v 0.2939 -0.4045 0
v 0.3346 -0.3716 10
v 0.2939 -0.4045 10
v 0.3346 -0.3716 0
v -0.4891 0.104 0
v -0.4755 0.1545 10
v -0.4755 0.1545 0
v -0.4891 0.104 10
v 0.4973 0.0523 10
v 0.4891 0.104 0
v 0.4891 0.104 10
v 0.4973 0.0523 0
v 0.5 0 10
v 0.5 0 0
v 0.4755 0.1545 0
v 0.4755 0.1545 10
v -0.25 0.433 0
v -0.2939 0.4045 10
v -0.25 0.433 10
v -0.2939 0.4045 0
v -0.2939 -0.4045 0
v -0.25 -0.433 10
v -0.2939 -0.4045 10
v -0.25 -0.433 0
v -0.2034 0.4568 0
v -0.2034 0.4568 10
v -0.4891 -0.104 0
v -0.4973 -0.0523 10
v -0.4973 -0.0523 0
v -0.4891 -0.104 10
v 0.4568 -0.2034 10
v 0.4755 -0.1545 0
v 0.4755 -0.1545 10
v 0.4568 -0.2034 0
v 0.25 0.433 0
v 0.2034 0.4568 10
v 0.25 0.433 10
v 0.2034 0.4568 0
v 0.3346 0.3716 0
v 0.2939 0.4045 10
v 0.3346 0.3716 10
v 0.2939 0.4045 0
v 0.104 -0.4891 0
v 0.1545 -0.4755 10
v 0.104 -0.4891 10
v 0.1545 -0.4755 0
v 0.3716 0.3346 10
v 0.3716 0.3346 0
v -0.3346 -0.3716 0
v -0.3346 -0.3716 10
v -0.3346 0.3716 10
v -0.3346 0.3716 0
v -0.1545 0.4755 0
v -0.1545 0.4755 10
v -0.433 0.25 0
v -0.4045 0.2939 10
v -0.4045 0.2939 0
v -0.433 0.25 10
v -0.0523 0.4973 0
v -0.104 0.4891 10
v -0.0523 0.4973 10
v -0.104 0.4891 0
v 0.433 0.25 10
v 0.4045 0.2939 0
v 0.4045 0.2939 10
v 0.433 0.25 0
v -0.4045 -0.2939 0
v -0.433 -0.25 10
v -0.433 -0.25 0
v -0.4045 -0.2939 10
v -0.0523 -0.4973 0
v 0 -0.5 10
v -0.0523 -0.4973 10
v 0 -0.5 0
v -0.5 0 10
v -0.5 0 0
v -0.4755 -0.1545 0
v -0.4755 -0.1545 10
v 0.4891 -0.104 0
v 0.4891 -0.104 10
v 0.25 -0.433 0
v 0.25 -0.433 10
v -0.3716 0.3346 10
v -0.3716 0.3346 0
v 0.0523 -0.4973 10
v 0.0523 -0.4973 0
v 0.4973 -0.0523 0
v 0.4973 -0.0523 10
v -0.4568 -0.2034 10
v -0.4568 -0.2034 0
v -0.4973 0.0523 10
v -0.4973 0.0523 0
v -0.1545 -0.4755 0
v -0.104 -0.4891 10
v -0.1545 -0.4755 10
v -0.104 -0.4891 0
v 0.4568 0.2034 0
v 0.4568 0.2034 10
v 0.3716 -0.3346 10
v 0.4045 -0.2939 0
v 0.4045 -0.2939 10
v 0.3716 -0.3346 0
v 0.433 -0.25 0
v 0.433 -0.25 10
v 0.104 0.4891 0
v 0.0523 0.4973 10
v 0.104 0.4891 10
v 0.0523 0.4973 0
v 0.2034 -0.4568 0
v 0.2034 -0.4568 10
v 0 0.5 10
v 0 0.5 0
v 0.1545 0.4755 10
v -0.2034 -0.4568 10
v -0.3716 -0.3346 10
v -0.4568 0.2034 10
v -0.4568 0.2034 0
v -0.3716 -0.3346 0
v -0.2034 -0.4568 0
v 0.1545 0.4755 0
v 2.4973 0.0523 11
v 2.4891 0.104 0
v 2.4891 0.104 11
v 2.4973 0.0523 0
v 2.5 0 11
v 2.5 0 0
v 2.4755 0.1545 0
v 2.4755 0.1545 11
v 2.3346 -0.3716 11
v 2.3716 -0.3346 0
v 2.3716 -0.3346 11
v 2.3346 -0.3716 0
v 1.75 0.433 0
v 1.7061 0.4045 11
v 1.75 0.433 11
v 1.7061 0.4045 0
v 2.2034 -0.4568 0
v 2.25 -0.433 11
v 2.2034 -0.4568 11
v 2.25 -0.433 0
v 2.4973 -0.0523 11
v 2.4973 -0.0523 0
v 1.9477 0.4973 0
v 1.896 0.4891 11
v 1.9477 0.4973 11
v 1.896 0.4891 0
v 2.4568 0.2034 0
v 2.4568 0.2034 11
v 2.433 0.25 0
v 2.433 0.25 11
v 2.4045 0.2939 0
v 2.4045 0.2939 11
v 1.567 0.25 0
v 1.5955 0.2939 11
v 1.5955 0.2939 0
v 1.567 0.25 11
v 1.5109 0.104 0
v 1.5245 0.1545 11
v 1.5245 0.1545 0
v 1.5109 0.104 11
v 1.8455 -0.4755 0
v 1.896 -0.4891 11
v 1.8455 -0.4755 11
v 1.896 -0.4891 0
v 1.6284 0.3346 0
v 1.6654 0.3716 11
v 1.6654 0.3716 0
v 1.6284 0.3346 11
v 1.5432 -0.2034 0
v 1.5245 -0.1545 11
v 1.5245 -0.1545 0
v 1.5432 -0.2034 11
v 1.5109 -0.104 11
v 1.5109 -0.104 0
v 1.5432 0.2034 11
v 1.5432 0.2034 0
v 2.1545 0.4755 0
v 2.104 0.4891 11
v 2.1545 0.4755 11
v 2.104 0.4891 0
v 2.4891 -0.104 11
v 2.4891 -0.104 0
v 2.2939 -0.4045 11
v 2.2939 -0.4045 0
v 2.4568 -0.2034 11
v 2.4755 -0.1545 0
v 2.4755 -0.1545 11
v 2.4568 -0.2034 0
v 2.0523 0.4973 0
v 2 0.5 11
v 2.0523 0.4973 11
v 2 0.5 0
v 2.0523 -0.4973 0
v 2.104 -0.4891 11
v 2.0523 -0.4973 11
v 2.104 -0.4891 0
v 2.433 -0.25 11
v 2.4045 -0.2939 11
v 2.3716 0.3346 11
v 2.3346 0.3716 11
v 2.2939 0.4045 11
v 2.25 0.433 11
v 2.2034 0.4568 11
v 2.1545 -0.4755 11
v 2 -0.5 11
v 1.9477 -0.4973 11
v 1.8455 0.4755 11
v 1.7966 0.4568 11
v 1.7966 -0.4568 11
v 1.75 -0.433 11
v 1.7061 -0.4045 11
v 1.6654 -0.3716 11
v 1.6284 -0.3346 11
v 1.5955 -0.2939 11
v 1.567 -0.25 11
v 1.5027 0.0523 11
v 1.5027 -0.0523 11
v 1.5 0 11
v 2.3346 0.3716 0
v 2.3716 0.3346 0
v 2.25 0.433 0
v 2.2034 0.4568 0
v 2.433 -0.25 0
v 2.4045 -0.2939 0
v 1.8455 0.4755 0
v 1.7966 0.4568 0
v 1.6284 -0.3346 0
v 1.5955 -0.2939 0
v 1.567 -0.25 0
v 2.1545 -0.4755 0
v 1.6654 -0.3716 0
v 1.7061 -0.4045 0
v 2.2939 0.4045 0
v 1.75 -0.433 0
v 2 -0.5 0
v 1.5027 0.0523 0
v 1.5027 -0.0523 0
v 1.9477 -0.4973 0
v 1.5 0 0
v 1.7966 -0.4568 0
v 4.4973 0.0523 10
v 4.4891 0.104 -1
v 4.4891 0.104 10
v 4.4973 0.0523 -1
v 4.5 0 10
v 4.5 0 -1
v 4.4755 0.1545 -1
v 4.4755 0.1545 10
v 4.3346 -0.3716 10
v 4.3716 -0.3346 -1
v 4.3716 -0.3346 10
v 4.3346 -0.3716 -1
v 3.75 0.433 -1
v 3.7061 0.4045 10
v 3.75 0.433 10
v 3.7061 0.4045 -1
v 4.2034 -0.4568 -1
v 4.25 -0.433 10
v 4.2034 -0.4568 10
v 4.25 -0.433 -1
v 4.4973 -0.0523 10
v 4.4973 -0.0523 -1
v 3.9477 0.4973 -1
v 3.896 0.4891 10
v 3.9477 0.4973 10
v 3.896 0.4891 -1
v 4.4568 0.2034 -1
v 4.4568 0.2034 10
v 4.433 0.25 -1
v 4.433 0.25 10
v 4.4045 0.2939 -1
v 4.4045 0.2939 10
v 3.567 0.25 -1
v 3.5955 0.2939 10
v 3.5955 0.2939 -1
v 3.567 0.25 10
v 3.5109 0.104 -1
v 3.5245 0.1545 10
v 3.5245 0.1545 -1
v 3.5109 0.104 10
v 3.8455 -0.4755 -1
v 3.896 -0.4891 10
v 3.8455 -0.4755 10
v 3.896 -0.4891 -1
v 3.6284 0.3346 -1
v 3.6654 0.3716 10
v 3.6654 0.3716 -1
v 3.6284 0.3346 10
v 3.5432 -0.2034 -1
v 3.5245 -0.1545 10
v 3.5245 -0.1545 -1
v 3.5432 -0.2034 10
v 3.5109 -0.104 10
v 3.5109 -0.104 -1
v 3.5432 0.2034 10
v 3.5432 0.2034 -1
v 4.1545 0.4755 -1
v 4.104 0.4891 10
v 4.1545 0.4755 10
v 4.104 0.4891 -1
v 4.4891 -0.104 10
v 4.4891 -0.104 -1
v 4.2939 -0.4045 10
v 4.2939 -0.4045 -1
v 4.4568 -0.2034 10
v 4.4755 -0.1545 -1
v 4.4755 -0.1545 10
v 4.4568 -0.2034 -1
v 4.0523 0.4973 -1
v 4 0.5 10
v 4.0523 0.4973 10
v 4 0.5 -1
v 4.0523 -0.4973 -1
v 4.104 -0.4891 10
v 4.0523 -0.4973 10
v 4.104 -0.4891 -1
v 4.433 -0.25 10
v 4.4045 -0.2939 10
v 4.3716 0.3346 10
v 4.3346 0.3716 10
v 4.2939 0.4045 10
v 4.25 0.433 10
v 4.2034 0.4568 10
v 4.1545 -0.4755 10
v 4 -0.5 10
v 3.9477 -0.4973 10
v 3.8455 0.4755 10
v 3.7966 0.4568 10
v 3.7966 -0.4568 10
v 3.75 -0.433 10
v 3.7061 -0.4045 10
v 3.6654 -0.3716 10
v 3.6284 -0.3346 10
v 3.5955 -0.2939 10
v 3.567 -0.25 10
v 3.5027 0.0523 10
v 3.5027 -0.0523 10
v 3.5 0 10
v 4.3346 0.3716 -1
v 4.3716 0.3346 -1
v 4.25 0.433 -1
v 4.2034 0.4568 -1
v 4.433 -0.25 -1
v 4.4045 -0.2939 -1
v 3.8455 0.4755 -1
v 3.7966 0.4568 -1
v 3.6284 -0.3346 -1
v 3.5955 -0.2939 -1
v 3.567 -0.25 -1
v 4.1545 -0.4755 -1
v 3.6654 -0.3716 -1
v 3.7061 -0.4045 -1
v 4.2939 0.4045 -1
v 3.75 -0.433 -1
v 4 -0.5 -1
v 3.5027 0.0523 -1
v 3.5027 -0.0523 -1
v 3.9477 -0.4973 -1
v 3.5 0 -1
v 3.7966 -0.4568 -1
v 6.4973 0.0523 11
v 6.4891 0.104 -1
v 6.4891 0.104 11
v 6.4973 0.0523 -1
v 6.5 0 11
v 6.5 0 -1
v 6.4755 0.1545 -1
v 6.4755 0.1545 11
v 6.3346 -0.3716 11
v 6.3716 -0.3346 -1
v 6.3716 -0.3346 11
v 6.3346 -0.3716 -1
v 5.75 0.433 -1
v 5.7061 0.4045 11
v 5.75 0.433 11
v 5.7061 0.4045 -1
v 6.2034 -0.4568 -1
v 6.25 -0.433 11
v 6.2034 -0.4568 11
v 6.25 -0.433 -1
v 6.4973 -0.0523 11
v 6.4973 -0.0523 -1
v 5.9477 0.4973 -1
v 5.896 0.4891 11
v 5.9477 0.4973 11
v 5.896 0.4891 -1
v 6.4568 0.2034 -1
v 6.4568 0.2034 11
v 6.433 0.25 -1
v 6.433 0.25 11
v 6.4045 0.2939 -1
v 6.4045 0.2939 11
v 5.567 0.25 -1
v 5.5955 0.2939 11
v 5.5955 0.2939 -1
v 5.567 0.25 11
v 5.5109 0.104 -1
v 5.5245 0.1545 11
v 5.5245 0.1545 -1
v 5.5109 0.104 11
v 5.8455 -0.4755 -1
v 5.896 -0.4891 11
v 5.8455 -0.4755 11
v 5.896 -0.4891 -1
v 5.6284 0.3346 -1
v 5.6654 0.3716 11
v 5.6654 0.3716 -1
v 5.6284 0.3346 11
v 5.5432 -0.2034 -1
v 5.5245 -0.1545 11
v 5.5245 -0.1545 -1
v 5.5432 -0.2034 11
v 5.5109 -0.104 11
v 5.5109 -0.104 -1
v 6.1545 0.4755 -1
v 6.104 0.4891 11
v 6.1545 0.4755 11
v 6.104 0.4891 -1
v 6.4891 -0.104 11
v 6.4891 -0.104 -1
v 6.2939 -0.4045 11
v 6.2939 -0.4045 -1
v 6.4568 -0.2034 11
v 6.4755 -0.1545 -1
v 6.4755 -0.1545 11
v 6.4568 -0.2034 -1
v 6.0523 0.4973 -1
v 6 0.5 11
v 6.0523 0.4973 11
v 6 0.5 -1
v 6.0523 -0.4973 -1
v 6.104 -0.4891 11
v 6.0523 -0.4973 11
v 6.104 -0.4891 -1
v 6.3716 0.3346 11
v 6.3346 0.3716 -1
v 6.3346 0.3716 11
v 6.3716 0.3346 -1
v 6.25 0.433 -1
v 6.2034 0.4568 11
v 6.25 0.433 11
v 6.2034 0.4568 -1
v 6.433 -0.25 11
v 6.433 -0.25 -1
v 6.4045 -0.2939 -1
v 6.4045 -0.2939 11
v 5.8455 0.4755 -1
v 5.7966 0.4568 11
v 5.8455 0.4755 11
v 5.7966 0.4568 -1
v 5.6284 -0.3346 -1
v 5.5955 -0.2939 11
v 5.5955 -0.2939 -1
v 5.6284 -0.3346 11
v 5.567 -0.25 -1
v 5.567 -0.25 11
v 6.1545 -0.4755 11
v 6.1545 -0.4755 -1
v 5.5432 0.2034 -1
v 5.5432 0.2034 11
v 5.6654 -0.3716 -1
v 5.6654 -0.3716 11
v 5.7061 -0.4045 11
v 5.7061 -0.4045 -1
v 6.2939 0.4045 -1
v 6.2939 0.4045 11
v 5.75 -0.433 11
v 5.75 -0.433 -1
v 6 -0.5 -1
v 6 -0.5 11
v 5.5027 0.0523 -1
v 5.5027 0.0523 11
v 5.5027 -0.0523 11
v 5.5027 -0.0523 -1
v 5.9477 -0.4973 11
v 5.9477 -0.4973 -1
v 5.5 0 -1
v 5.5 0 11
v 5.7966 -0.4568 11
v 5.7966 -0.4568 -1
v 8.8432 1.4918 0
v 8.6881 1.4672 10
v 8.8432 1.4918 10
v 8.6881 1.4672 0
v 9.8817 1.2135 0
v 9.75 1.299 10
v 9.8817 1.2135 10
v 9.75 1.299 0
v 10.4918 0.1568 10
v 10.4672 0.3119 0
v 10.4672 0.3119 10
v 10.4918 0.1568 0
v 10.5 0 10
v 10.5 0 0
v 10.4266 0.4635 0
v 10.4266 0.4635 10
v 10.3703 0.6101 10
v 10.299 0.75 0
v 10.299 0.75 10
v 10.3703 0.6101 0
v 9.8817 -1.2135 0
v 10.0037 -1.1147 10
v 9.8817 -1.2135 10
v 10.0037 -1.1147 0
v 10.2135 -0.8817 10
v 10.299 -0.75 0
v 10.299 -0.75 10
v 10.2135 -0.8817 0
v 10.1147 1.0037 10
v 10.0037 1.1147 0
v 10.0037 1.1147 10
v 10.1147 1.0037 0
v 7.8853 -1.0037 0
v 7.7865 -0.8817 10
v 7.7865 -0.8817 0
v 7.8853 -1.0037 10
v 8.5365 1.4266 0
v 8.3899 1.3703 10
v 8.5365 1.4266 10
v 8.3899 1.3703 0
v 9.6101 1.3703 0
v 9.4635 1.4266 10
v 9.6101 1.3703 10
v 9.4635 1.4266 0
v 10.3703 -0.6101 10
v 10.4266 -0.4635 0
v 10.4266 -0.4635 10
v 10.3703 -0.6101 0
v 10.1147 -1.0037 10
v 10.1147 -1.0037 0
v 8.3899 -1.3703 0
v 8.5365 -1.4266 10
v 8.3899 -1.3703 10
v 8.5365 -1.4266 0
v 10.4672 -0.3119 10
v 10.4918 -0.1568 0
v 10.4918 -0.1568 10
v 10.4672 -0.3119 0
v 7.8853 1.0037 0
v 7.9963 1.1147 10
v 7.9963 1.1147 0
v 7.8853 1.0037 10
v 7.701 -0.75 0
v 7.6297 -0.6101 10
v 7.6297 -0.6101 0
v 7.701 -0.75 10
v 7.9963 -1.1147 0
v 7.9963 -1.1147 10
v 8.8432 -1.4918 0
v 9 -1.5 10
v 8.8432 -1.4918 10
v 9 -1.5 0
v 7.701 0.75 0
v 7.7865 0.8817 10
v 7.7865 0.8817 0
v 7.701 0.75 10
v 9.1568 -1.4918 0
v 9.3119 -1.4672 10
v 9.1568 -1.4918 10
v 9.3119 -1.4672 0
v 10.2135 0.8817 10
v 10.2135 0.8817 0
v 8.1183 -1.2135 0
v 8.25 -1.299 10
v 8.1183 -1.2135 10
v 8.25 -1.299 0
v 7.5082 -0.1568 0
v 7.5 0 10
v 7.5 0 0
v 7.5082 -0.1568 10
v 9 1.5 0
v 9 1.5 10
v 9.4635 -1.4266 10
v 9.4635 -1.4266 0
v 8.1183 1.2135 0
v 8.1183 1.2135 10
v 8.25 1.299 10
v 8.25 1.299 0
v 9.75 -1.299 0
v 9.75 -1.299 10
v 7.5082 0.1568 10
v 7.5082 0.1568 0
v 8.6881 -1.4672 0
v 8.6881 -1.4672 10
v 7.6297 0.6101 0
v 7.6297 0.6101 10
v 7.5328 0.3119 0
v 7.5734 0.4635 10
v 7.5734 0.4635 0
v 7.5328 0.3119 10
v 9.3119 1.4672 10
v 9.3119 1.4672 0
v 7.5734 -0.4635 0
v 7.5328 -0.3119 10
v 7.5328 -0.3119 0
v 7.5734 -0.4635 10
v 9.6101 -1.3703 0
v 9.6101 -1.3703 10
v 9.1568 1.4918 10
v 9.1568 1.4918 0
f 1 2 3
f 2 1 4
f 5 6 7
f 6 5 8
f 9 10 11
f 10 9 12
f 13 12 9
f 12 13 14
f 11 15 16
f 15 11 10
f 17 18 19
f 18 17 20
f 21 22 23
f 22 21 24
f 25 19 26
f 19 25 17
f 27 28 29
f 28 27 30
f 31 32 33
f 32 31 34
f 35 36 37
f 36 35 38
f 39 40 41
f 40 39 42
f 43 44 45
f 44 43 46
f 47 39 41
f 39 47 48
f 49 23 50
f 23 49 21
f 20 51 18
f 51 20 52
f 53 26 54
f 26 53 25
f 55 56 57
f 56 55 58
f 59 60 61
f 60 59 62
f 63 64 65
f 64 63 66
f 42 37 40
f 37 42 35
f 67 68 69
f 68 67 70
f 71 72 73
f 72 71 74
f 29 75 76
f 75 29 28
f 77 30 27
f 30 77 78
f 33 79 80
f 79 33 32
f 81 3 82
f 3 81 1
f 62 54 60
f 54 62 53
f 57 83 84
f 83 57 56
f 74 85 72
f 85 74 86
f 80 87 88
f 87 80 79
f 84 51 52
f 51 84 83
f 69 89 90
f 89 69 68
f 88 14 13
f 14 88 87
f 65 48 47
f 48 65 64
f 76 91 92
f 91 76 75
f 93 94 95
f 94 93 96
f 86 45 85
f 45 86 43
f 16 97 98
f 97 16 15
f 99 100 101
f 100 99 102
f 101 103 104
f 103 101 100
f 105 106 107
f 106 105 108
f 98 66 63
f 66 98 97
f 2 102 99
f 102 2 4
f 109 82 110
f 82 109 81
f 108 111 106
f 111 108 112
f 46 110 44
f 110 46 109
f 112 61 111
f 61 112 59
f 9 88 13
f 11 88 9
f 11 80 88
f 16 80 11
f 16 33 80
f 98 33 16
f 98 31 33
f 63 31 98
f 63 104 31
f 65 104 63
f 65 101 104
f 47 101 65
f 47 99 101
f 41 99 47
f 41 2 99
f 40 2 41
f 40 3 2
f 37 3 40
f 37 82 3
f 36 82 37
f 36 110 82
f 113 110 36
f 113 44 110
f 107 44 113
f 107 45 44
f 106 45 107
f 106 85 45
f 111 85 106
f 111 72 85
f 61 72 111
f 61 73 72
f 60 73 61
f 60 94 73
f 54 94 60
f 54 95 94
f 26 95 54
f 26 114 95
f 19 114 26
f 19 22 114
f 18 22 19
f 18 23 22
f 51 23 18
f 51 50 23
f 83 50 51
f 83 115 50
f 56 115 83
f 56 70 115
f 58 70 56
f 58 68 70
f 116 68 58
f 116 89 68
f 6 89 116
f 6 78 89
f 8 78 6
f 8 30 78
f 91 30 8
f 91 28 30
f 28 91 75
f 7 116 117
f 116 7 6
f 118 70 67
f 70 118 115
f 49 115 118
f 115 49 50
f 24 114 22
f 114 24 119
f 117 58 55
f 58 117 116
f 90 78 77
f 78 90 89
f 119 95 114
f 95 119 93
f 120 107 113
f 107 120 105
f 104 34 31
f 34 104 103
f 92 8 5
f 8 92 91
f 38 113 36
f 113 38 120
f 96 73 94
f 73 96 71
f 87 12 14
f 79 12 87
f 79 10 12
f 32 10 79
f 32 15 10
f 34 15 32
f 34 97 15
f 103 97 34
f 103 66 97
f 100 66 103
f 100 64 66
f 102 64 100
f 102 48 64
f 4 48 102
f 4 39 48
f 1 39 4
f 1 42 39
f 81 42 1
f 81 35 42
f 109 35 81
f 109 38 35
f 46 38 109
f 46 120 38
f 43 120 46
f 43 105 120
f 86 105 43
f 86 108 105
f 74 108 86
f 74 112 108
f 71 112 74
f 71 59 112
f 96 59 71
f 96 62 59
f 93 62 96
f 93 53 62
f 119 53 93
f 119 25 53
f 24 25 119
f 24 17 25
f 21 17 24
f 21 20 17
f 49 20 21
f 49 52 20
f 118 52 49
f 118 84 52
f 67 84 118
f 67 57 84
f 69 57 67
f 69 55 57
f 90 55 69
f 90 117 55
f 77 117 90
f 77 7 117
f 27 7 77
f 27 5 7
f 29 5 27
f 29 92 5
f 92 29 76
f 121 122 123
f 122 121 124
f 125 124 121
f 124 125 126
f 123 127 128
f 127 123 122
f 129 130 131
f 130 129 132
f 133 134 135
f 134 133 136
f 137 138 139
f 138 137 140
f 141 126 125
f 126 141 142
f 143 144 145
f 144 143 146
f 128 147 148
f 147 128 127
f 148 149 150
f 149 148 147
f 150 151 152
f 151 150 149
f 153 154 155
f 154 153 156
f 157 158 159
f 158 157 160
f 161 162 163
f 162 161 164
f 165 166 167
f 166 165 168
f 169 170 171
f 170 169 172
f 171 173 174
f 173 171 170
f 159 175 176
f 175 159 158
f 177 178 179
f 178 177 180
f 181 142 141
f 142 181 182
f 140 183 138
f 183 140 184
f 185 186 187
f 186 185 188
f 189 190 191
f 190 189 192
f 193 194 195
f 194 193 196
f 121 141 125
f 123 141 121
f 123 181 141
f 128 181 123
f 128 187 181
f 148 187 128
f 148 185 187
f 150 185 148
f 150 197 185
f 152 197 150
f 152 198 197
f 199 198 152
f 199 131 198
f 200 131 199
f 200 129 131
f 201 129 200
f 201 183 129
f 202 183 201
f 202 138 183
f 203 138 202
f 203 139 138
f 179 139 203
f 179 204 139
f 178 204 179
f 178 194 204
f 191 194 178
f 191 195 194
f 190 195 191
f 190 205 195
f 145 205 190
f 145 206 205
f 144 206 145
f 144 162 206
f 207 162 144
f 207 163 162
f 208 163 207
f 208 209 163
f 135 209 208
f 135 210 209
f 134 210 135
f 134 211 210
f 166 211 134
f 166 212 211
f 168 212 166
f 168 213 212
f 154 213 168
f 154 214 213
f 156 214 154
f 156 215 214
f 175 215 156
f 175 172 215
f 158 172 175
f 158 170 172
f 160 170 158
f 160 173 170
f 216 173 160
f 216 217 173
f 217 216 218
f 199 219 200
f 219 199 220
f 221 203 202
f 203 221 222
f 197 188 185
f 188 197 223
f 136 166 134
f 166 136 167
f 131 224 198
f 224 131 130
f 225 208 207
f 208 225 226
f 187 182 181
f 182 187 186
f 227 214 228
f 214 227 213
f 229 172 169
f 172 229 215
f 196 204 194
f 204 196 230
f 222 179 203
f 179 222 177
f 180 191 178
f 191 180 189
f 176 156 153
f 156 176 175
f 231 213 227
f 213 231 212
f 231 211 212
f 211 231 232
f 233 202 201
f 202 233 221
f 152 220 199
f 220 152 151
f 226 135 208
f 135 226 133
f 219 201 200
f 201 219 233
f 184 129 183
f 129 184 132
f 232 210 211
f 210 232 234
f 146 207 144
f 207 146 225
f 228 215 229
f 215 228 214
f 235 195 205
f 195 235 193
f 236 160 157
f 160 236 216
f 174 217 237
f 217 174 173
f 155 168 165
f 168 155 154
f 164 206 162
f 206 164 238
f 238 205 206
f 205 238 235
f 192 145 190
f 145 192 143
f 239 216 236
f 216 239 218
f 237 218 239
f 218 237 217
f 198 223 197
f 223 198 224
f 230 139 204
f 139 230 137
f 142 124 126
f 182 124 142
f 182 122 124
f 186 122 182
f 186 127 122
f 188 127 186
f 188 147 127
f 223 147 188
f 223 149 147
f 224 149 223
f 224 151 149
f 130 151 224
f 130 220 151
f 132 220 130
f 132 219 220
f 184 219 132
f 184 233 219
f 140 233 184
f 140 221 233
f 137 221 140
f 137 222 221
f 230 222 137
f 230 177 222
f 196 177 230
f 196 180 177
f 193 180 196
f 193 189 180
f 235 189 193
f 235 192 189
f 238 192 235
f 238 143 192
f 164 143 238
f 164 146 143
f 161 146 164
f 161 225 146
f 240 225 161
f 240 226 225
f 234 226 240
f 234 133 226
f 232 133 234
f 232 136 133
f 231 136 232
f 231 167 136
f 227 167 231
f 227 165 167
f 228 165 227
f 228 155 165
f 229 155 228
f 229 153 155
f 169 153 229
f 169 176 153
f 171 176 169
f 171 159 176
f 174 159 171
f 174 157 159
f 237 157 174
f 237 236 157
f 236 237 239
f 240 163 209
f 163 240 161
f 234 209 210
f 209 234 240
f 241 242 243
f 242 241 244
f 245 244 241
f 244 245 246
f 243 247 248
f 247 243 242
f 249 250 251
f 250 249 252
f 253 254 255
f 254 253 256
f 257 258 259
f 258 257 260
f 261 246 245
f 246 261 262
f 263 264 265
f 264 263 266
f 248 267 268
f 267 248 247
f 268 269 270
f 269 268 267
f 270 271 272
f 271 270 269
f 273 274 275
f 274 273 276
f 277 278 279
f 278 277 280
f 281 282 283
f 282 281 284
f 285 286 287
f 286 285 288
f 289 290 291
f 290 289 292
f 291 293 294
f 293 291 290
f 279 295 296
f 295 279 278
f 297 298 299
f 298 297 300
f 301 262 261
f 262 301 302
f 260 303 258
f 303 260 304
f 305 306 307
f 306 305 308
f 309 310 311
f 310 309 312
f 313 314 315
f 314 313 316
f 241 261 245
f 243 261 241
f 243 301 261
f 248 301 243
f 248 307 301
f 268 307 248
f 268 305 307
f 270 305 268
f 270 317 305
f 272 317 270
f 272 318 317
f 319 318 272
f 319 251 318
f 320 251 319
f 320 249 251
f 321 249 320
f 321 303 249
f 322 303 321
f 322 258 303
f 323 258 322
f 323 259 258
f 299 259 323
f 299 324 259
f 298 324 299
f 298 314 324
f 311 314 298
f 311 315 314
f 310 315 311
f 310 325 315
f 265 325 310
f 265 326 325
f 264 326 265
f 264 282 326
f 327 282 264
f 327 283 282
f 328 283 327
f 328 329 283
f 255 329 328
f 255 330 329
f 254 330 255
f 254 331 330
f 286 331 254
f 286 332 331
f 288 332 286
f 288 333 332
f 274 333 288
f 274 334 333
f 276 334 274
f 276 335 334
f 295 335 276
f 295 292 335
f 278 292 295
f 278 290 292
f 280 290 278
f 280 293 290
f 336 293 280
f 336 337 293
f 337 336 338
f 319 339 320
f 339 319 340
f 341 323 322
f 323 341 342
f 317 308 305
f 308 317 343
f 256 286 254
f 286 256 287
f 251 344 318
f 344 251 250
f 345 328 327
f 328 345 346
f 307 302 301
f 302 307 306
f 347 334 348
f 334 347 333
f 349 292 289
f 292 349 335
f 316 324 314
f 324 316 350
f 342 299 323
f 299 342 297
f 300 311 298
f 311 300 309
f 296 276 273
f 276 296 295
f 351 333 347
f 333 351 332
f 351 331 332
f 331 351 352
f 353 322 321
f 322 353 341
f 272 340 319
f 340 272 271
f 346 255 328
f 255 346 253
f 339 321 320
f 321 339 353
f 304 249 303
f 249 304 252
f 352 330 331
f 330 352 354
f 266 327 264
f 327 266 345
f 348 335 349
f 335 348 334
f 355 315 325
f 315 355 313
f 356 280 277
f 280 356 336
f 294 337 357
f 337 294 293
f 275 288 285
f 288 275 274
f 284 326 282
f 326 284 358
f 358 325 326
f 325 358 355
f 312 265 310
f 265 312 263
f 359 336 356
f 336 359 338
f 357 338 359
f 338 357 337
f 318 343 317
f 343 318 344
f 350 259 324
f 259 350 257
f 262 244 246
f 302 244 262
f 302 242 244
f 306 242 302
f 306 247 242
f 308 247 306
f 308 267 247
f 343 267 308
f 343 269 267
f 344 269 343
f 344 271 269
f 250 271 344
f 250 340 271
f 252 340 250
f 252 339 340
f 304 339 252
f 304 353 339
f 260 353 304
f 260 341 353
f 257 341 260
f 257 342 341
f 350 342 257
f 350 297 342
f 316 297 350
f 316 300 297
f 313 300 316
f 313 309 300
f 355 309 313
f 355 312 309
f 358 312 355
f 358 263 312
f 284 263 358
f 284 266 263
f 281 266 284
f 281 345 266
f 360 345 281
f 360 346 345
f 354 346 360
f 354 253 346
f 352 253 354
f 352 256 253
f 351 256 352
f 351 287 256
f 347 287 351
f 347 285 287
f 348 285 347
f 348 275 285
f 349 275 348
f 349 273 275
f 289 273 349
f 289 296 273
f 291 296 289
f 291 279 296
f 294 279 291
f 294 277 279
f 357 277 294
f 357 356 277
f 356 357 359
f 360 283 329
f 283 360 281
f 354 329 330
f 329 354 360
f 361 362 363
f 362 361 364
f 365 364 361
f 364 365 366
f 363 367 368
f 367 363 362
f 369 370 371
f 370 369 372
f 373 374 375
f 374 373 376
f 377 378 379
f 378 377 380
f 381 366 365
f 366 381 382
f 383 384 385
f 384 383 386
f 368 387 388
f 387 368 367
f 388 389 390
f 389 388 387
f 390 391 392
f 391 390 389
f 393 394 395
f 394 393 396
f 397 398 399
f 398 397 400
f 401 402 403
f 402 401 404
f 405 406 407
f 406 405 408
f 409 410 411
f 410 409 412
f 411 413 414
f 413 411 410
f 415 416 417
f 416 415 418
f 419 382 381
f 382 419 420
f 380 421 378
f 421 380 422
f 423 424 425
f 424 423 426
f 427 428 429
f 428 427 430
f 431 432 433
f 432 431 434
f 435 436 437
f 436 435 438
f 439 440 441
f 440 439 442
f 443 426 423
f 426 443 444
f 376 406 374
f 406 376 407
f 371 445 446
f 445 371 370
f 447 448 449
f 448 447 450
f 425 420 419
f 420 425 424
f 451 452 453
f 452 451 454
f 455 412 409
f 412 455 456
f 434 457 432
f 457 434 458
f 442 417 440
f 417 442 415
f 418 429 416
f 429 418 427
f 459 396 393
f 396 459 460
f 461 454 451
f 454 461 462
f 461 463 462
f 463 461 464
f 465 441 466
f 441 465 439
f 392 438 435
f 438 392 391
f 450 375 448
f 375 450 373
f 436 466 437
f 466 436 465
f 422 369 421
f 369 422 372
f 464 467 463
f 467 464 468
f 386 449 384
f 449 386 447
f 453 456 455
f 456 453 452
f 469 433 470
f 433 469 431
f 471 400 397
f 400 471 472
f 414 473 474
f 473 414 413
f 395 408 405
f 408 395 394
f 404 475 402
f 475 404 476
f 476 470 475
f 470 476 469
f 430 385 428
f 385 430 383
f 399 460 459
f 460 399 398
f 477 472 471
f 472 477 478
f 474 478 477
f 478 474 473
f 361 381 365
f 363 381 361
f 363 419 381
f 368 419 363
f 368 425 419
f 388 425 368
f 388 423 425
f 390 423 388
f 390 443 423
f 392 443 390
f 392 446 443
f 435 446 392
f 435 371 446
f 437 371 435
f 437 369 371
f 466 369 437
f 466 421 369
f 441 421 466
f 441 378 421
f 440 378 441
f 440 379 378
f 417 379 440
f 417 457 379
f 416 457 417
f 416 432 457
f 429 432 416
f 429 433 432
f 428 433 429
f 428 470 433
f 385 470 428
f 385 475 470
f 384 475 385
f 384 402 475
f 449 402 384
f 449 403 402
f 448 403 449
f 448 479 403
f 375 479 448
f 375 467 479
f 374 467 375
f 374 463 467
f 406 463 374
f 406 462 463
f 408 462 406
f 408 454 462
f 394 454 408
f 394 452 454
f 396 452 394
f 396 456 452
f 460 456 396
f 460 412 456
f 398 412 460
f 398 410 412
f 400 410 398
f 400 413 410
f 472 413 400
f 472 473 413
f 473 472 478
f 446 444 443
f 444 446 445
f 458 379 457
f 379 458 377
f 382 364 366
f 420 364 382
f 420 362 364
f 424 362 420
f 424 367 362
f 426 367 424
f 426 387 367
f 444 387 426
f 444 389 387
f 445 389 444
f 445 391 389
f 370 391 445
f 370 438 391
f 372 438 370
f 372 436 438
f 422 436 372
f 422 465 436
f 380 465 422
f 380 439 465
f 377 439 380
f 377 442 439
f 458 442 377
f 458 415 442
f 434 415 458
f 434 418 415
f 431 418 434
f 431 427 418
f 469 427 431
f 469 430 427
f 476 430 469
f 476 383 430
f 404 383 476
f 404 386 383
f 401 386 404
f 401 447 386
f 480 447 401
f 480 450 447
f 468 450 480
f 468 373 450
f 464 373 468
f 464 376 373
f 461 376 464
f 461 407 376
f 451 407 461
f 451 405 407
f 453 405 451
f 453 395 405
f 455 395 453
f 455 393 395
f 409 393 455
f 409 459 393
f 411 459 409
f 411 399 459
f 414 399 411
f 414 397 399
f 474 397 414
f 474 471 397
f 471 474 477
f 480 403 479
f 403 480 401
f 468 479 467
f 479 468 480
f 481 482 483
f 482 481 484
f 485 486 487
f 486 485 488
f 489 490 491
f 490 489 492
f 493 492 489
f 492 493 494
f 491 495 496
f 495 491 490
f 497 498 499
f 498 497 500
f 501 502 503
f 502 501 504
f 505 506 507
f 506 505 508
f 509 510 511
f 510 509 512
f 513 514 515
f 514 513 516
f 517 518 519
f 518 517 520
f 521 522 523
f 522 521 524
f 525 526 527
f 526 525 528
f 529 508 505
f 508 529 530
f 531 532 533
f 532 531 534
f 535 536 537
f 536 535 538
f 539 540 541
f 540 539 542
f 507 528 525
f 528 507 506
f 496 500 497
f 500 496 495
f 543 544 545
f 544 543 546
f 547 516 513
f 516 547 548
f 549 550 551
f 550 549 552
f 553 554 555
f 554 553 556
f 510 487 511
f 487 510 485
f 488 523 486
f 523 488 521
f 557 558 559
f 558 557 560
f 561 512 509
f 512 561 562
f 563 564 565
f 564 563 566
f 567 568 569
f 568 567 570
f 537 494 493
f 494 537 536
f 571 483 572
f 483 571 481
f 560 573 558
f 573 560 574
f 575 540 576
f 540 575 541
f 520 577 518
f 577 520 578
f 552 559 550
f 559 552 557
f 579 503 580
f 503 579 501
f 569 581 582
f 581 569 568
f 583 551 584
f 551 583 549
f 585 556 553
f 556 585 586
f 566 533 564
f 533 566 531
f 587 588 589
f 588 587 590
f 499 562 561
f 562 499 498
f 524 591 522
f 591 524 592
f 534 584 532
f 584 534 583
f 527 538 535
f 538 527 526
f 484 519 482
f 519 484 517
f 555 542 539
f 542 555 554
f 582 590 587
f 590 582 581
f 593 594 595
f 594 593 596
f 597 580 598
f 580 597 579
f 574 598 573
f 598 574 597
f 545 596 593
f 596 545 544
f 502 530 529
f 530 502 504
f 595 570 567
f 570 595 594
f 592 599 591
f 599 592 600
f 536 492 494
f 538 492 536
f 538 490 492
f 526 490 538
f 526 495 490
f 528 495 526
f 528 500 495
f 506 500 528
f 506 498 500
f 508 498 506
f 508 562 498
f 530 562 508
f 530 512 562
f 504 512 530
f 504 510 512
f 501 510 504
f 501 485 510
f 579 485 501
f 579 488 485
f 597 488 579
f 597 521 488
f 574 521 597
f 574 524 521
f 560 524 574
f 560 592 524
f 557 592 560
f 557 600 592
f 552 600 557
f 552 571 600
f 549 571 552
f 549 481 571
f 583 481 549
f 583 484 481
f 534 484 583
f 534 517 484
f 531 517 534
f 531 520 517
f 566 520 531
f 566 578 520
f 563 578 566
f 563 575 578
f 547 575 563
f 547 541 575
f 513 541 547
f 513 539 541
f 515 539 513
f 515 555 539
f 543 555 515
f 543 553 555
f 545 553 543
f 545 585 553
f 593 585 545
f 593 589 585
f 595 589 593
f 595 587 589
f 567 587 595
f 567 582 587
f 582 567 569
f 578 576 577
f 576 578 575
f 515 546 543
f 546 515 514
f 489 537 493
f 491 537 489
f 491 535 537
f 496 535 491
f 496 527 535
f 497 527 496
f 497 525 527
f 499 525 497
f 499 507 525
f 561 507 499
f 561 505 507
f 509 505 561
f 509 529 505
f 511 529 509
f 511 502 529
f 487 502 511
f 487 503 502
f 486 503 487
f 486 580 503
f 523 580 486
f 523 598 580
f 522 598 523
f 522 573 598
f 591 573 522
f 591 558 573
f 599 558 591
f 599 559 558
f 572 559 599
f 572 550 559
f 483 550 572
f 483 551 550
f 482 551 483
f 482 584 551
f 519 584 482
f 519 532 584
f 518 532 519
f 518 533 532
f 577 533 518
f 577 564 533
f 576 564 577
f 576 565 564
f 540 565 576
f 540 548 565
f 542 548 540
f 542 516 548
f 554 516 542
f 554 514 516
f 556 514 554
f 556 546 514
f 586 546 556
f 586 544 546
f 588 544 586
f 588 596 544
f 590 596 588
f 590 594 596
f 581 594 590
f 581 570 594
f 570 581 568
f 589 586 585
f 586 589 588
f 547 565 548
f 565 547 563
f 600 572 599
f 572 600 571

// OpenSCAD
// Unit of length: Unit.MM
$fn = 60;

union()
{
   cylinder(h = 10.0, d = 1.0, center = false);
   translate(v = [2.0, 0.0, 0.0])
   {
      cylinder(h = 11.0, d = 1.0, center = false);
   }
   translate(v = [4.0, 0.0, 0.0])
   {
      translate(v = [0.0, 0.0, -1.0])
      {
         cylinder(h = 11.0, d = 1.0, center = false);
      }
   }
   translate(v = [6.0, 0.0, 0.0])
   {
      translate(v = [0.0, 0.0, -1.0])
      {
         cylinder(h = 12.0, d = 1.0, center = false);
      }
   }
   translate(v = [9.0, 0.0, 0.0])
   {
      cylinder(h = 10.0, d = 3.0, center = false);
   }
}
